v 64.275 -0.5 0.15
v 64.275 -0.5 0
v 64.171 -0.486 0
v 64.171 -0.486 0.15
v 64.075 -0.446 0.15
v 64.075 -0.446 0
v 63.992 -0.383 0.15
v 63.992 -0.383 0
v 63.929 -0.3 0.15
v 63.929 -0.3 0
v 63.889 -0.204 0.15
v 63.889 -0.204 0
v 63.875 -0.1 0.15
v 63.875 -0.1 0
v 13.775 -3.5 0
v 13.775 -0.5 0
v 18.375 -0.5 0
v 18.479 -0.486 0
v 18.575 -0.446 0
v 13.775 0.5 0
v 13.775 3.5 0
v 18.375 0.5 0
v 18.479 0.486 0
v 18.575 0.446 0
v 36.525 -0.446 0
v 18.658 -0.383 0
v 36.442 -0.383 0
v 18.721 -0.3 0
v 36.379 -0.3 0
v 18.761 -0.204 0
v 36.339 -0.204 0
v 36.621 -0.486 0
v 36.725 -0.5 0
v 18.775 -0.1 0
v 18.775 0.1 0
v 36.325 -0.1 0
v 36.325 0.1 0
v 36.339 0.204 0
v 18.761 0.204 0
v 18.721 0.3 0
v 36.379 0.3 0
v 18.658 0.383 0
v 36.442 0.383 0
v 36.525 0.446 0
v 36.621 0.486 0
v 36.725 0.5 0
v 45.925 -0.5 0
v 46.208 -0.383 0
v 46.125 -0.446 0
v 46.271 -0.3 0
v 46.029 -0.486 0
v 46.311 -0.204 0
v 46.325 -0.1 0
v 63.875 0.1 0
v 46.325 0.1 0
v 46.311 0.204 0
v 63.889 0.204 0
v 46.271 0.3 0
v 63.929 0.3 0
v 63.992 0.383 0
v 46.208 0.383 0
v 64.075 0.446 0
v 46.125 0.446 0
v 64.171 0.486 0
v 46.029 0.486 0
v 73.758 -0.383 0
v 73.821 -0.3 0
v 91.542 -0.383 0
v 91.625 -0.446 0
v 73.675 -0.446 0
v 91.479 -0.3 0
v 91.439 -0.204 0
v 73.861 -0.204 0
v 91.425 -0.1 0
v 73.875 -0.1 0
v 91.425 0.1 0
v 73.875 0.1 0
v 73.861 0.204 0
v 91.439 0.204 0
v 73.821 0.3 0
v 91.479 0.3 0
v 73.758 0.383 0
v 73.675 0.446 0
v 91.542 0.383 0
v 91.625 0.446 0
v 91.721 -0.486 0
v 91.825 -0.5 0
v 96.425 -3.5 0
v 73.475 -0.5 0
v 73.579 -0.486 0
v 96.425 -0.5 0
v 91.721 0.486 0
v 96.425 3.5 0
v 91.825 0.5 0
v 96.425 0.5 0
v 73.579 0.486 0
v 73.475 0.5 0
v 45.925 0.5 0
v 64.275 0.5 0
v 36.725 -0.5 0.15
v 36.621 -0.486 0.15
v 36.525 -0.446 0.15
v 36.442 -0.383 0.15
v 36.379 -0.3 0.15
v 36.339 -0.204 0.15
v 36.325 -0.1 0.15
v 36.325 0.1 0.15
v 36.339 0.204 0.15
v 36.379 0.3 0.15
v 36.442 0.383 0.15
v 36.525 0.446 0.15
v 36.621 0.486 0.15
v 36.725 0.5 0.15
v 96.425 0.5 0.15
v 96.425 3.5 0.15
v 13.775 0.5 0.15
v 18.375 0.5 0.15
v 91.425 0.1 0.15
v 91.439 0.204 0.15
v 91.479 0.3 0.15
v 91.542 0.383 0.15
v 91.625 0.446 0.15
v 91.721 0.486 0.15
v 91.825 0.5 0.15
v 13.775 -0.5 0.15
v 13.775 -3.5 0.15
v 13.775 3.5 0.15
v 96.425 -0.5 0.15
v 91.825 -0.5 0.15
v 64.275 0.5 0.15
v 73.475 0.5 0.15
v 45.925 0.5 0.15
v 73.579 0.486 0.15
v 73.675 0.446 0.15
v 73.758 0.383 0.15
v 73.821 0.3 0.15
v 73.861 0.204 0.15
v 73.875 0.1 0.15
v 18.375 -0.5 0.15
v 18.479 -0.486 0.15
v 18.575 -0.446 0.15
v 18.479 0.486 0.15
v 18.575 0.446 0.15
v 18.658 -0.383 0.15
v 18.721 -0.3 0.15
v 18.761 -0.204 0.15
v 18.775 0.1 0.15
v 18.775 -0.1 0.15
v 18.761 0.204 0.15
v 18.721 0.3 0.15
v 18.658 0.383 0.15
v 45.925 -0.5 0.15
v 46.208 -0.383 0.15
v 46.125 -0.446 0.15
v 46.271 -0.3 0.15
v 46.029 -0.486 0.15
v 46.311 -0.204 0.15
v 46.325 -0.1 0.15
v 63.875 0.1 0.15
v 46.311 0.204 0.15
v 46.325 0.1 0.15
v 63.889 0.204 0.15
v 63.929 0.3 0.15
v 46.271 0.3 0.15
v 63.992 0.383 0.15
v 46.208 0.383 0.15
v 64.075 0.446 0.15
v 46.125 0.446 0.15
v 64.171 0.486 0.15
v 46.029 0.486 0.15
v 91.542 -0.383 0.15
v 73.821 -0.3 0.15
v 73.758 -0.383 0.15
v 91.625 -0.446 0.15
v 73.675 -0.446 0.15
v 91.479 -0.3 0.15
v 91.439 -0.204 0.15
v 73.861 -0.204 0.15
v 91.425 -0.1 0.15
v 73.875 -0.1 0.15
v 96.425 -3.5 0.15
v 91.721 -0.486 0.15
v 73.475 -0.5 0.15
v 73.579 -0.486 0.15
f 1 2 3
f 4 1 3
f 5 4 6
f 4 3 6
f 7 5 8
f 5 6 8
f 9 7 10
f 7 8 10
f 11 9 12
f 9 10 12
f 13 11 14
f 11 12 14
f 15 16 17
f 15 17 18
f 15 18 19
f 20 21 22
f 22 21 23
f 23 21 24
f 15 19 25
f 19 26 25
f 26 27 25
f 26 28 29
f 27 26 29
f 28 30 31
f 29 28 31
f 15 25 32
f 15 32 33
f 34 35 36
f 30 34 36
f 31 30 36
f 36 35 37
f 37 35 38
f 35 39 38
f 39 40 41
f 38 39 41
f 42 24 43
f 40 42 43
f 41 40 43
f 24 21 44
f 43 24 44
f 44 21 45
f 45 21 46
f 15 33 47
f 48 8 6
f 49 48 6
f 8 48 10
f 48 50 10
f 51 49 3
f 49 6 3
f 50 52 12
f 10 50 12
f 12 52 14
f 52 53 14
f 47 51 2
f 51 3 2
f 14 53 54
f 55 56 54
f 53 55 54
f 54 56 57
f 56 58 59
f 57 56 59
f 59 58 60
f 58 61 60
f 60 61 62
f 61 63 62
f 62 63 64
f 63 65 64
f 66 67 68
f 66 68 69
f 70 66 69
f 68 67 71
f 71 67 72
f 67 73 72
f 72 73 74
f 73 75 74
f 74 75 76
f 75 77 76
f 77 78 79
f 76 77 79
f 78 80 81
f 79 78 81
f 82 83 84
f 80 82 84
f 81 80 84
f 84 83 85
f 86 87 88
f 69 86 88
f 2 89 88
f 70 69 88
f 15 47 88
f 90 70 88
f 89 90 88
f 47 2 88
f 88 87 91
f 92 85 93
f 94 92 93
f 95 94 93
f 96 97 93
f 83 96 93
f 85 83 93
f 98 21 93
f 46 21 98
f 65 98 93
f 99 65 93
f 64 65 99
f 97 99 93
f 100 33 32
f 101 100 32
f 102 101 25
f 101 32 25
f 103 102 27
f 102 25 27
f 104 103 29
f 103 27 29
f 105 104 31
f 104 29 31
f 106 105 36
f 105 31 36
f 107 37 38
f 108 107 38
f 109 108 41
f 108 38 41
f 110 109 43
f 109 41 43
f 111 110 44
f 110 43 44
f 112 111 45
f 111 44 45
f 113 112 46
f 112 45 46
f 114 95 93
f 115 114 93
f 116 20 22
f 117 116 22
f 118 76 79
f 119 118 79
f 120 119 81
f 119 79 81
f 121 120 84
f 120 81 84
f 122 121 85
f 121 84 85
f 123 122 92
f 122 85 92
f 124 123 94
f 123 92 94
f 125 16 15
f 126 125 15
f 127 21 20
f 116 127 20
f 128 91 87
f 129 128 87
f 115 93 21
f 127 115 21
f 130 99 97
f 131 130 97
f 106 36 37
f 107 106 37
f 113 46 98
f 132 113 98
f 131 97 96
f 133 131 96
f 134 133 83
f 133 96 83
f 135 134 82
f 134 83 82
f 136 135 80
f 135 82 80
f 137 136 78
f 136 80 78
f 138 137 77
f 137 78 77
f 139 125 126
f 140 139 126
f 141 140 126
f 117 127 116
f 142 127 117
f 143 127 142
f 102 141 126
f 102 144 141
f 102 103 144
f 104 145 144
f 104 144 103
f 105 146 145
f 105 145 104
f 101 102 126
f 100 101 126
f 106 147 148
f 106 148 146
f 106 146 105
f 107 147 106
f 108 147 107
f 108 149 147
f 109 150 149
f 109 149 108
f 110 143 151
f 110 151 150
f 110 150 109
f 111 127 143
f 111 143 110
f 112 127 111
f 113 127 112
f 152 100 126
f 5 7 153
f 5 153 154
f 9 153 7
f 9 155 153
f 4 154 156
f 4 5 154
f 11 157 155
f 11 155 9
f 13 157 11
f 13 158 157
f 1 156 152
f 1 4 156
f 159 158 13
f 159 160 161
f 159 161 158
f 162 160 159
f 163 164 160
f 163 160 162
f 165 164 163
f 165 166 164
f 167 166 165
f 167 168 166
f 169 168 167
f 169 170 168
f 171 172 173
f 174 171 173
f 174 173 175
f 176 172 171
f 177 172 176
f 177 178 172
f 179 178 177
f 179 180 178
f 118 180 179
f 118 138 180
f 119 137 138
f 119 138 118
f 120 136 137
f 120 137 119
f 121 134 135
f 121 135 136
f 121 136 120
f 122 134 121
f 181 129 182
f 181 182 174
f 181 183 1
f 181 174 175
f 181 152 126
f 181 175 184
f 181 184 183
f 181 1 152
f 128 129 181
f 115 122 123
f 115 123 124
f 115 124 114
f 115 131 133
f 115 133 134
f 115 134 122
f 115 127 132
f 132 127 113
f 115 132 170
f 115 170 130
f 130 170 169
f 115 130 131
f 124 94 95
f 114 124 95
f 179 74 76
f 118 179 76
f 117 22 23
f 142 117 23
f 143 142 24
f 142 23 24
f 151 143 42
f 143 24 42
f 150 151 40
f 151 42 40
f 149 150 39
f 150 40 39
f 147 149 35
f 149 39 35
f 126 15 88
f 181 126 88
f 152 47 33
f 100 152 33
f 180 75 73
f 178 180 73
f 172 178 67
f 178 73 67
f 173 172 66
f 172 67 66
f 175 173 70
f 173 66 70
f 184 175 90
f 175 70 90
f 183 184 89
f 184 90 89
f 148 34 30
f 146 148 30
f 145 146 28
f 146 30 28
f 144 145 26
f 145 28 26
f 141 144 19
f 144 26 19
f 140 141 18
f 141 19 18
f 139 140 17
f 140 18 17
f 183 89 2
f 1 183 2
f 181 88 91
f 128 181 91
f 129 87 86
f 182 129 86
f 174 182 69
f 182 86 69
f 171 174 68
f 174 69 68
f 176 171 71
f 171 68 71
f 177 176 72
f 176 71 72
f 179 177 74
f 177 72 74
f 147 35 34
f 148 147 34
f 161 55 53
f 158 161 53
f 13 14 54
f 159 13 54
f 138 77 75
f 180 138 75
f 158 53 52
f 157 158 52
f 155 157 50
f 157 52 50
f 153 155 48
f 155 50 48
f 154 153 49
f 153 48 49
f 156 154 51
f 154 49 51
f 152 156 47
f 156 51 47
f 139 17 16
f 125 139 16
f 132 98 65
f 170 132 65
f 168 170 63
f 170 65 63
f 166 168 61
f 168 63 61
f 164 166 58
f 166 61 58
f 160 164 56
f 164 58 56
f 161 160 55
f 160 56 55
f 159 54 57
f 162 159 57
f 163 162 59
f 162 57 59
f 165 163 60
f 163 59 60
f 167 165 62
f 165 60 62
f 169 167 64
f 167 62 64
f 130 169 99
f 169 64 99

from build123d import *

# Parameters (mm, degrees)
F1_DEPTH = 0.15


with BuildPart() as f1:
    # F0 (on Top) → F1 (new body)
    with BuildSketch(Plane.XY):
        with BuildLine():
            Line((68.875, -0.5), (68.875, -3.5))
            Line((68.875, -3.5), (82.65, -3.5))
            Line((82.65, -3.5), (96.425, -3.5))
            Line((96.425, -3.5), (96.425, -0.5))
            Line((96.425, -0.5), (91.825, -0.5))
            ThreePointArc((91.825, -0.5), (91.542157, -0.382843), (91.425, -0.1))
            Line((91.425, -0.1), (91.425, 0.1))
            ThreePointArc((91.425, 0.1), (91.542157, 0.382843), (91.825, 0.5))
            Line((91.825, 0.5), (96.425, 0.5))
            Line((96.425, 0.5), (96.425, 3.5))
            Line((96.425, 3.5), (82.65, 3.5))
            Line((82.65, 3.5), (68.875, 3.5))
            Line((68.875, 3.5), (68.875, 0.5))
            Line((68.875, 0.5), (73.475, 0.5))
            ThreePointArc((73.475, 0.5), (73.757843, 0.382843), (73.875, 0.1))
            Line((73.875, 0.1), (73.875, -0.1))
            ThreePointArc((73.875, -0.1), (73.757843, -0.382843), (73.475, -0.5))
            Line((73.475, -0.5), (68.875, -0.5))
        make_face()
        with BuildLine():
            Line((13.775, -0.5), (13.775, -3.5))
            Line((13.775, -3.5), (27.55, -3.5))
            Line((27.55, -3.5), (41.325, -3.5))
            Line((41.325, -3.5), (41.325, -0.5))
            Line((41.325, -0.5), (36.725, -0.5))
            ThreePointArc((36.725, -0.5), (36.442157, -0.382843), (36.325, -0.1))
            Line((36.325, -0.1), (36.325, 0.1))
            ThreePointArc((36.325, 0.1), (36.442157, 0.382843), (36.725, 0.5))
            Line((36.725, 0.5), (41.325, 0.5))
            Line((41.325, 0.5), (41.325, 3.5))
            Line((41.325, 3.5), (27.55, 3.5))
            Line((27.55, 3.5), (13.775, 3.5))
            Line((13.775, 3.5), (13.775, 0.5))
            Line((13.775, 0.5), (18.375, 0.5))
            ThreePointArc((18.375, 0.5), (18.657843, 0.382843), (18.775, 0.1))
            Line((18.775, 0.1), (18.775, -0.1))
            ThreePointArc((18.775, -0.1), (18.657843, -0.382843), (18.375, -0.5))
            Line((18.375, -0.5), (13.775, -0.5))
        make_face()
        with BuildLine():
            Line((41.325, -0.5), (41.325, -3.5))
            Line((41.325, -3.5), (55.1, -3.5))
            Line((55.1, -3.5), (68.875, -3.5))
            Line((68.875, -3.5), (68.875, -0.5))
            Line((68.875, -0.5), (64.275, -0.5))
            ThreePointArc((64.275, -0.5), (63.992157, -0.382843), (63.875, -0.1))
            Line((63.875, -0.1), (63.875, 0.1))
            ThreePointArc((63.875, 0.1), (63.992157, 0.382843), (64.275, 0.5))
            Line((64.275, 0.5), (68.875, 0.5))
            Line((68.875, 0.5), (68.875, 3.5))
            Line((68.875, 3.5), (55.1, 3.5))
            Line((55.1, 3.5), (41.325, 3.5))
            Line((41.325, 3.5), (41.325, 0.5))
            Line((41.325, 0.5), (45.925, 0.5))
            ThreePointArc((45.925, 0.5), (46.207843, 0.382843), (46.325, 0.1))
            Line((46.325, 0.1), (46.325, -0.1))
            ThreePointArc((46.325, -0.1), (46.207843, -0.382843), (45.925, -0.5))
            Line((45.925, -0.5), (41.325, -0.5))
        make_face()
    extrude(amount=F1_DEPTH)


solid = f1.part
